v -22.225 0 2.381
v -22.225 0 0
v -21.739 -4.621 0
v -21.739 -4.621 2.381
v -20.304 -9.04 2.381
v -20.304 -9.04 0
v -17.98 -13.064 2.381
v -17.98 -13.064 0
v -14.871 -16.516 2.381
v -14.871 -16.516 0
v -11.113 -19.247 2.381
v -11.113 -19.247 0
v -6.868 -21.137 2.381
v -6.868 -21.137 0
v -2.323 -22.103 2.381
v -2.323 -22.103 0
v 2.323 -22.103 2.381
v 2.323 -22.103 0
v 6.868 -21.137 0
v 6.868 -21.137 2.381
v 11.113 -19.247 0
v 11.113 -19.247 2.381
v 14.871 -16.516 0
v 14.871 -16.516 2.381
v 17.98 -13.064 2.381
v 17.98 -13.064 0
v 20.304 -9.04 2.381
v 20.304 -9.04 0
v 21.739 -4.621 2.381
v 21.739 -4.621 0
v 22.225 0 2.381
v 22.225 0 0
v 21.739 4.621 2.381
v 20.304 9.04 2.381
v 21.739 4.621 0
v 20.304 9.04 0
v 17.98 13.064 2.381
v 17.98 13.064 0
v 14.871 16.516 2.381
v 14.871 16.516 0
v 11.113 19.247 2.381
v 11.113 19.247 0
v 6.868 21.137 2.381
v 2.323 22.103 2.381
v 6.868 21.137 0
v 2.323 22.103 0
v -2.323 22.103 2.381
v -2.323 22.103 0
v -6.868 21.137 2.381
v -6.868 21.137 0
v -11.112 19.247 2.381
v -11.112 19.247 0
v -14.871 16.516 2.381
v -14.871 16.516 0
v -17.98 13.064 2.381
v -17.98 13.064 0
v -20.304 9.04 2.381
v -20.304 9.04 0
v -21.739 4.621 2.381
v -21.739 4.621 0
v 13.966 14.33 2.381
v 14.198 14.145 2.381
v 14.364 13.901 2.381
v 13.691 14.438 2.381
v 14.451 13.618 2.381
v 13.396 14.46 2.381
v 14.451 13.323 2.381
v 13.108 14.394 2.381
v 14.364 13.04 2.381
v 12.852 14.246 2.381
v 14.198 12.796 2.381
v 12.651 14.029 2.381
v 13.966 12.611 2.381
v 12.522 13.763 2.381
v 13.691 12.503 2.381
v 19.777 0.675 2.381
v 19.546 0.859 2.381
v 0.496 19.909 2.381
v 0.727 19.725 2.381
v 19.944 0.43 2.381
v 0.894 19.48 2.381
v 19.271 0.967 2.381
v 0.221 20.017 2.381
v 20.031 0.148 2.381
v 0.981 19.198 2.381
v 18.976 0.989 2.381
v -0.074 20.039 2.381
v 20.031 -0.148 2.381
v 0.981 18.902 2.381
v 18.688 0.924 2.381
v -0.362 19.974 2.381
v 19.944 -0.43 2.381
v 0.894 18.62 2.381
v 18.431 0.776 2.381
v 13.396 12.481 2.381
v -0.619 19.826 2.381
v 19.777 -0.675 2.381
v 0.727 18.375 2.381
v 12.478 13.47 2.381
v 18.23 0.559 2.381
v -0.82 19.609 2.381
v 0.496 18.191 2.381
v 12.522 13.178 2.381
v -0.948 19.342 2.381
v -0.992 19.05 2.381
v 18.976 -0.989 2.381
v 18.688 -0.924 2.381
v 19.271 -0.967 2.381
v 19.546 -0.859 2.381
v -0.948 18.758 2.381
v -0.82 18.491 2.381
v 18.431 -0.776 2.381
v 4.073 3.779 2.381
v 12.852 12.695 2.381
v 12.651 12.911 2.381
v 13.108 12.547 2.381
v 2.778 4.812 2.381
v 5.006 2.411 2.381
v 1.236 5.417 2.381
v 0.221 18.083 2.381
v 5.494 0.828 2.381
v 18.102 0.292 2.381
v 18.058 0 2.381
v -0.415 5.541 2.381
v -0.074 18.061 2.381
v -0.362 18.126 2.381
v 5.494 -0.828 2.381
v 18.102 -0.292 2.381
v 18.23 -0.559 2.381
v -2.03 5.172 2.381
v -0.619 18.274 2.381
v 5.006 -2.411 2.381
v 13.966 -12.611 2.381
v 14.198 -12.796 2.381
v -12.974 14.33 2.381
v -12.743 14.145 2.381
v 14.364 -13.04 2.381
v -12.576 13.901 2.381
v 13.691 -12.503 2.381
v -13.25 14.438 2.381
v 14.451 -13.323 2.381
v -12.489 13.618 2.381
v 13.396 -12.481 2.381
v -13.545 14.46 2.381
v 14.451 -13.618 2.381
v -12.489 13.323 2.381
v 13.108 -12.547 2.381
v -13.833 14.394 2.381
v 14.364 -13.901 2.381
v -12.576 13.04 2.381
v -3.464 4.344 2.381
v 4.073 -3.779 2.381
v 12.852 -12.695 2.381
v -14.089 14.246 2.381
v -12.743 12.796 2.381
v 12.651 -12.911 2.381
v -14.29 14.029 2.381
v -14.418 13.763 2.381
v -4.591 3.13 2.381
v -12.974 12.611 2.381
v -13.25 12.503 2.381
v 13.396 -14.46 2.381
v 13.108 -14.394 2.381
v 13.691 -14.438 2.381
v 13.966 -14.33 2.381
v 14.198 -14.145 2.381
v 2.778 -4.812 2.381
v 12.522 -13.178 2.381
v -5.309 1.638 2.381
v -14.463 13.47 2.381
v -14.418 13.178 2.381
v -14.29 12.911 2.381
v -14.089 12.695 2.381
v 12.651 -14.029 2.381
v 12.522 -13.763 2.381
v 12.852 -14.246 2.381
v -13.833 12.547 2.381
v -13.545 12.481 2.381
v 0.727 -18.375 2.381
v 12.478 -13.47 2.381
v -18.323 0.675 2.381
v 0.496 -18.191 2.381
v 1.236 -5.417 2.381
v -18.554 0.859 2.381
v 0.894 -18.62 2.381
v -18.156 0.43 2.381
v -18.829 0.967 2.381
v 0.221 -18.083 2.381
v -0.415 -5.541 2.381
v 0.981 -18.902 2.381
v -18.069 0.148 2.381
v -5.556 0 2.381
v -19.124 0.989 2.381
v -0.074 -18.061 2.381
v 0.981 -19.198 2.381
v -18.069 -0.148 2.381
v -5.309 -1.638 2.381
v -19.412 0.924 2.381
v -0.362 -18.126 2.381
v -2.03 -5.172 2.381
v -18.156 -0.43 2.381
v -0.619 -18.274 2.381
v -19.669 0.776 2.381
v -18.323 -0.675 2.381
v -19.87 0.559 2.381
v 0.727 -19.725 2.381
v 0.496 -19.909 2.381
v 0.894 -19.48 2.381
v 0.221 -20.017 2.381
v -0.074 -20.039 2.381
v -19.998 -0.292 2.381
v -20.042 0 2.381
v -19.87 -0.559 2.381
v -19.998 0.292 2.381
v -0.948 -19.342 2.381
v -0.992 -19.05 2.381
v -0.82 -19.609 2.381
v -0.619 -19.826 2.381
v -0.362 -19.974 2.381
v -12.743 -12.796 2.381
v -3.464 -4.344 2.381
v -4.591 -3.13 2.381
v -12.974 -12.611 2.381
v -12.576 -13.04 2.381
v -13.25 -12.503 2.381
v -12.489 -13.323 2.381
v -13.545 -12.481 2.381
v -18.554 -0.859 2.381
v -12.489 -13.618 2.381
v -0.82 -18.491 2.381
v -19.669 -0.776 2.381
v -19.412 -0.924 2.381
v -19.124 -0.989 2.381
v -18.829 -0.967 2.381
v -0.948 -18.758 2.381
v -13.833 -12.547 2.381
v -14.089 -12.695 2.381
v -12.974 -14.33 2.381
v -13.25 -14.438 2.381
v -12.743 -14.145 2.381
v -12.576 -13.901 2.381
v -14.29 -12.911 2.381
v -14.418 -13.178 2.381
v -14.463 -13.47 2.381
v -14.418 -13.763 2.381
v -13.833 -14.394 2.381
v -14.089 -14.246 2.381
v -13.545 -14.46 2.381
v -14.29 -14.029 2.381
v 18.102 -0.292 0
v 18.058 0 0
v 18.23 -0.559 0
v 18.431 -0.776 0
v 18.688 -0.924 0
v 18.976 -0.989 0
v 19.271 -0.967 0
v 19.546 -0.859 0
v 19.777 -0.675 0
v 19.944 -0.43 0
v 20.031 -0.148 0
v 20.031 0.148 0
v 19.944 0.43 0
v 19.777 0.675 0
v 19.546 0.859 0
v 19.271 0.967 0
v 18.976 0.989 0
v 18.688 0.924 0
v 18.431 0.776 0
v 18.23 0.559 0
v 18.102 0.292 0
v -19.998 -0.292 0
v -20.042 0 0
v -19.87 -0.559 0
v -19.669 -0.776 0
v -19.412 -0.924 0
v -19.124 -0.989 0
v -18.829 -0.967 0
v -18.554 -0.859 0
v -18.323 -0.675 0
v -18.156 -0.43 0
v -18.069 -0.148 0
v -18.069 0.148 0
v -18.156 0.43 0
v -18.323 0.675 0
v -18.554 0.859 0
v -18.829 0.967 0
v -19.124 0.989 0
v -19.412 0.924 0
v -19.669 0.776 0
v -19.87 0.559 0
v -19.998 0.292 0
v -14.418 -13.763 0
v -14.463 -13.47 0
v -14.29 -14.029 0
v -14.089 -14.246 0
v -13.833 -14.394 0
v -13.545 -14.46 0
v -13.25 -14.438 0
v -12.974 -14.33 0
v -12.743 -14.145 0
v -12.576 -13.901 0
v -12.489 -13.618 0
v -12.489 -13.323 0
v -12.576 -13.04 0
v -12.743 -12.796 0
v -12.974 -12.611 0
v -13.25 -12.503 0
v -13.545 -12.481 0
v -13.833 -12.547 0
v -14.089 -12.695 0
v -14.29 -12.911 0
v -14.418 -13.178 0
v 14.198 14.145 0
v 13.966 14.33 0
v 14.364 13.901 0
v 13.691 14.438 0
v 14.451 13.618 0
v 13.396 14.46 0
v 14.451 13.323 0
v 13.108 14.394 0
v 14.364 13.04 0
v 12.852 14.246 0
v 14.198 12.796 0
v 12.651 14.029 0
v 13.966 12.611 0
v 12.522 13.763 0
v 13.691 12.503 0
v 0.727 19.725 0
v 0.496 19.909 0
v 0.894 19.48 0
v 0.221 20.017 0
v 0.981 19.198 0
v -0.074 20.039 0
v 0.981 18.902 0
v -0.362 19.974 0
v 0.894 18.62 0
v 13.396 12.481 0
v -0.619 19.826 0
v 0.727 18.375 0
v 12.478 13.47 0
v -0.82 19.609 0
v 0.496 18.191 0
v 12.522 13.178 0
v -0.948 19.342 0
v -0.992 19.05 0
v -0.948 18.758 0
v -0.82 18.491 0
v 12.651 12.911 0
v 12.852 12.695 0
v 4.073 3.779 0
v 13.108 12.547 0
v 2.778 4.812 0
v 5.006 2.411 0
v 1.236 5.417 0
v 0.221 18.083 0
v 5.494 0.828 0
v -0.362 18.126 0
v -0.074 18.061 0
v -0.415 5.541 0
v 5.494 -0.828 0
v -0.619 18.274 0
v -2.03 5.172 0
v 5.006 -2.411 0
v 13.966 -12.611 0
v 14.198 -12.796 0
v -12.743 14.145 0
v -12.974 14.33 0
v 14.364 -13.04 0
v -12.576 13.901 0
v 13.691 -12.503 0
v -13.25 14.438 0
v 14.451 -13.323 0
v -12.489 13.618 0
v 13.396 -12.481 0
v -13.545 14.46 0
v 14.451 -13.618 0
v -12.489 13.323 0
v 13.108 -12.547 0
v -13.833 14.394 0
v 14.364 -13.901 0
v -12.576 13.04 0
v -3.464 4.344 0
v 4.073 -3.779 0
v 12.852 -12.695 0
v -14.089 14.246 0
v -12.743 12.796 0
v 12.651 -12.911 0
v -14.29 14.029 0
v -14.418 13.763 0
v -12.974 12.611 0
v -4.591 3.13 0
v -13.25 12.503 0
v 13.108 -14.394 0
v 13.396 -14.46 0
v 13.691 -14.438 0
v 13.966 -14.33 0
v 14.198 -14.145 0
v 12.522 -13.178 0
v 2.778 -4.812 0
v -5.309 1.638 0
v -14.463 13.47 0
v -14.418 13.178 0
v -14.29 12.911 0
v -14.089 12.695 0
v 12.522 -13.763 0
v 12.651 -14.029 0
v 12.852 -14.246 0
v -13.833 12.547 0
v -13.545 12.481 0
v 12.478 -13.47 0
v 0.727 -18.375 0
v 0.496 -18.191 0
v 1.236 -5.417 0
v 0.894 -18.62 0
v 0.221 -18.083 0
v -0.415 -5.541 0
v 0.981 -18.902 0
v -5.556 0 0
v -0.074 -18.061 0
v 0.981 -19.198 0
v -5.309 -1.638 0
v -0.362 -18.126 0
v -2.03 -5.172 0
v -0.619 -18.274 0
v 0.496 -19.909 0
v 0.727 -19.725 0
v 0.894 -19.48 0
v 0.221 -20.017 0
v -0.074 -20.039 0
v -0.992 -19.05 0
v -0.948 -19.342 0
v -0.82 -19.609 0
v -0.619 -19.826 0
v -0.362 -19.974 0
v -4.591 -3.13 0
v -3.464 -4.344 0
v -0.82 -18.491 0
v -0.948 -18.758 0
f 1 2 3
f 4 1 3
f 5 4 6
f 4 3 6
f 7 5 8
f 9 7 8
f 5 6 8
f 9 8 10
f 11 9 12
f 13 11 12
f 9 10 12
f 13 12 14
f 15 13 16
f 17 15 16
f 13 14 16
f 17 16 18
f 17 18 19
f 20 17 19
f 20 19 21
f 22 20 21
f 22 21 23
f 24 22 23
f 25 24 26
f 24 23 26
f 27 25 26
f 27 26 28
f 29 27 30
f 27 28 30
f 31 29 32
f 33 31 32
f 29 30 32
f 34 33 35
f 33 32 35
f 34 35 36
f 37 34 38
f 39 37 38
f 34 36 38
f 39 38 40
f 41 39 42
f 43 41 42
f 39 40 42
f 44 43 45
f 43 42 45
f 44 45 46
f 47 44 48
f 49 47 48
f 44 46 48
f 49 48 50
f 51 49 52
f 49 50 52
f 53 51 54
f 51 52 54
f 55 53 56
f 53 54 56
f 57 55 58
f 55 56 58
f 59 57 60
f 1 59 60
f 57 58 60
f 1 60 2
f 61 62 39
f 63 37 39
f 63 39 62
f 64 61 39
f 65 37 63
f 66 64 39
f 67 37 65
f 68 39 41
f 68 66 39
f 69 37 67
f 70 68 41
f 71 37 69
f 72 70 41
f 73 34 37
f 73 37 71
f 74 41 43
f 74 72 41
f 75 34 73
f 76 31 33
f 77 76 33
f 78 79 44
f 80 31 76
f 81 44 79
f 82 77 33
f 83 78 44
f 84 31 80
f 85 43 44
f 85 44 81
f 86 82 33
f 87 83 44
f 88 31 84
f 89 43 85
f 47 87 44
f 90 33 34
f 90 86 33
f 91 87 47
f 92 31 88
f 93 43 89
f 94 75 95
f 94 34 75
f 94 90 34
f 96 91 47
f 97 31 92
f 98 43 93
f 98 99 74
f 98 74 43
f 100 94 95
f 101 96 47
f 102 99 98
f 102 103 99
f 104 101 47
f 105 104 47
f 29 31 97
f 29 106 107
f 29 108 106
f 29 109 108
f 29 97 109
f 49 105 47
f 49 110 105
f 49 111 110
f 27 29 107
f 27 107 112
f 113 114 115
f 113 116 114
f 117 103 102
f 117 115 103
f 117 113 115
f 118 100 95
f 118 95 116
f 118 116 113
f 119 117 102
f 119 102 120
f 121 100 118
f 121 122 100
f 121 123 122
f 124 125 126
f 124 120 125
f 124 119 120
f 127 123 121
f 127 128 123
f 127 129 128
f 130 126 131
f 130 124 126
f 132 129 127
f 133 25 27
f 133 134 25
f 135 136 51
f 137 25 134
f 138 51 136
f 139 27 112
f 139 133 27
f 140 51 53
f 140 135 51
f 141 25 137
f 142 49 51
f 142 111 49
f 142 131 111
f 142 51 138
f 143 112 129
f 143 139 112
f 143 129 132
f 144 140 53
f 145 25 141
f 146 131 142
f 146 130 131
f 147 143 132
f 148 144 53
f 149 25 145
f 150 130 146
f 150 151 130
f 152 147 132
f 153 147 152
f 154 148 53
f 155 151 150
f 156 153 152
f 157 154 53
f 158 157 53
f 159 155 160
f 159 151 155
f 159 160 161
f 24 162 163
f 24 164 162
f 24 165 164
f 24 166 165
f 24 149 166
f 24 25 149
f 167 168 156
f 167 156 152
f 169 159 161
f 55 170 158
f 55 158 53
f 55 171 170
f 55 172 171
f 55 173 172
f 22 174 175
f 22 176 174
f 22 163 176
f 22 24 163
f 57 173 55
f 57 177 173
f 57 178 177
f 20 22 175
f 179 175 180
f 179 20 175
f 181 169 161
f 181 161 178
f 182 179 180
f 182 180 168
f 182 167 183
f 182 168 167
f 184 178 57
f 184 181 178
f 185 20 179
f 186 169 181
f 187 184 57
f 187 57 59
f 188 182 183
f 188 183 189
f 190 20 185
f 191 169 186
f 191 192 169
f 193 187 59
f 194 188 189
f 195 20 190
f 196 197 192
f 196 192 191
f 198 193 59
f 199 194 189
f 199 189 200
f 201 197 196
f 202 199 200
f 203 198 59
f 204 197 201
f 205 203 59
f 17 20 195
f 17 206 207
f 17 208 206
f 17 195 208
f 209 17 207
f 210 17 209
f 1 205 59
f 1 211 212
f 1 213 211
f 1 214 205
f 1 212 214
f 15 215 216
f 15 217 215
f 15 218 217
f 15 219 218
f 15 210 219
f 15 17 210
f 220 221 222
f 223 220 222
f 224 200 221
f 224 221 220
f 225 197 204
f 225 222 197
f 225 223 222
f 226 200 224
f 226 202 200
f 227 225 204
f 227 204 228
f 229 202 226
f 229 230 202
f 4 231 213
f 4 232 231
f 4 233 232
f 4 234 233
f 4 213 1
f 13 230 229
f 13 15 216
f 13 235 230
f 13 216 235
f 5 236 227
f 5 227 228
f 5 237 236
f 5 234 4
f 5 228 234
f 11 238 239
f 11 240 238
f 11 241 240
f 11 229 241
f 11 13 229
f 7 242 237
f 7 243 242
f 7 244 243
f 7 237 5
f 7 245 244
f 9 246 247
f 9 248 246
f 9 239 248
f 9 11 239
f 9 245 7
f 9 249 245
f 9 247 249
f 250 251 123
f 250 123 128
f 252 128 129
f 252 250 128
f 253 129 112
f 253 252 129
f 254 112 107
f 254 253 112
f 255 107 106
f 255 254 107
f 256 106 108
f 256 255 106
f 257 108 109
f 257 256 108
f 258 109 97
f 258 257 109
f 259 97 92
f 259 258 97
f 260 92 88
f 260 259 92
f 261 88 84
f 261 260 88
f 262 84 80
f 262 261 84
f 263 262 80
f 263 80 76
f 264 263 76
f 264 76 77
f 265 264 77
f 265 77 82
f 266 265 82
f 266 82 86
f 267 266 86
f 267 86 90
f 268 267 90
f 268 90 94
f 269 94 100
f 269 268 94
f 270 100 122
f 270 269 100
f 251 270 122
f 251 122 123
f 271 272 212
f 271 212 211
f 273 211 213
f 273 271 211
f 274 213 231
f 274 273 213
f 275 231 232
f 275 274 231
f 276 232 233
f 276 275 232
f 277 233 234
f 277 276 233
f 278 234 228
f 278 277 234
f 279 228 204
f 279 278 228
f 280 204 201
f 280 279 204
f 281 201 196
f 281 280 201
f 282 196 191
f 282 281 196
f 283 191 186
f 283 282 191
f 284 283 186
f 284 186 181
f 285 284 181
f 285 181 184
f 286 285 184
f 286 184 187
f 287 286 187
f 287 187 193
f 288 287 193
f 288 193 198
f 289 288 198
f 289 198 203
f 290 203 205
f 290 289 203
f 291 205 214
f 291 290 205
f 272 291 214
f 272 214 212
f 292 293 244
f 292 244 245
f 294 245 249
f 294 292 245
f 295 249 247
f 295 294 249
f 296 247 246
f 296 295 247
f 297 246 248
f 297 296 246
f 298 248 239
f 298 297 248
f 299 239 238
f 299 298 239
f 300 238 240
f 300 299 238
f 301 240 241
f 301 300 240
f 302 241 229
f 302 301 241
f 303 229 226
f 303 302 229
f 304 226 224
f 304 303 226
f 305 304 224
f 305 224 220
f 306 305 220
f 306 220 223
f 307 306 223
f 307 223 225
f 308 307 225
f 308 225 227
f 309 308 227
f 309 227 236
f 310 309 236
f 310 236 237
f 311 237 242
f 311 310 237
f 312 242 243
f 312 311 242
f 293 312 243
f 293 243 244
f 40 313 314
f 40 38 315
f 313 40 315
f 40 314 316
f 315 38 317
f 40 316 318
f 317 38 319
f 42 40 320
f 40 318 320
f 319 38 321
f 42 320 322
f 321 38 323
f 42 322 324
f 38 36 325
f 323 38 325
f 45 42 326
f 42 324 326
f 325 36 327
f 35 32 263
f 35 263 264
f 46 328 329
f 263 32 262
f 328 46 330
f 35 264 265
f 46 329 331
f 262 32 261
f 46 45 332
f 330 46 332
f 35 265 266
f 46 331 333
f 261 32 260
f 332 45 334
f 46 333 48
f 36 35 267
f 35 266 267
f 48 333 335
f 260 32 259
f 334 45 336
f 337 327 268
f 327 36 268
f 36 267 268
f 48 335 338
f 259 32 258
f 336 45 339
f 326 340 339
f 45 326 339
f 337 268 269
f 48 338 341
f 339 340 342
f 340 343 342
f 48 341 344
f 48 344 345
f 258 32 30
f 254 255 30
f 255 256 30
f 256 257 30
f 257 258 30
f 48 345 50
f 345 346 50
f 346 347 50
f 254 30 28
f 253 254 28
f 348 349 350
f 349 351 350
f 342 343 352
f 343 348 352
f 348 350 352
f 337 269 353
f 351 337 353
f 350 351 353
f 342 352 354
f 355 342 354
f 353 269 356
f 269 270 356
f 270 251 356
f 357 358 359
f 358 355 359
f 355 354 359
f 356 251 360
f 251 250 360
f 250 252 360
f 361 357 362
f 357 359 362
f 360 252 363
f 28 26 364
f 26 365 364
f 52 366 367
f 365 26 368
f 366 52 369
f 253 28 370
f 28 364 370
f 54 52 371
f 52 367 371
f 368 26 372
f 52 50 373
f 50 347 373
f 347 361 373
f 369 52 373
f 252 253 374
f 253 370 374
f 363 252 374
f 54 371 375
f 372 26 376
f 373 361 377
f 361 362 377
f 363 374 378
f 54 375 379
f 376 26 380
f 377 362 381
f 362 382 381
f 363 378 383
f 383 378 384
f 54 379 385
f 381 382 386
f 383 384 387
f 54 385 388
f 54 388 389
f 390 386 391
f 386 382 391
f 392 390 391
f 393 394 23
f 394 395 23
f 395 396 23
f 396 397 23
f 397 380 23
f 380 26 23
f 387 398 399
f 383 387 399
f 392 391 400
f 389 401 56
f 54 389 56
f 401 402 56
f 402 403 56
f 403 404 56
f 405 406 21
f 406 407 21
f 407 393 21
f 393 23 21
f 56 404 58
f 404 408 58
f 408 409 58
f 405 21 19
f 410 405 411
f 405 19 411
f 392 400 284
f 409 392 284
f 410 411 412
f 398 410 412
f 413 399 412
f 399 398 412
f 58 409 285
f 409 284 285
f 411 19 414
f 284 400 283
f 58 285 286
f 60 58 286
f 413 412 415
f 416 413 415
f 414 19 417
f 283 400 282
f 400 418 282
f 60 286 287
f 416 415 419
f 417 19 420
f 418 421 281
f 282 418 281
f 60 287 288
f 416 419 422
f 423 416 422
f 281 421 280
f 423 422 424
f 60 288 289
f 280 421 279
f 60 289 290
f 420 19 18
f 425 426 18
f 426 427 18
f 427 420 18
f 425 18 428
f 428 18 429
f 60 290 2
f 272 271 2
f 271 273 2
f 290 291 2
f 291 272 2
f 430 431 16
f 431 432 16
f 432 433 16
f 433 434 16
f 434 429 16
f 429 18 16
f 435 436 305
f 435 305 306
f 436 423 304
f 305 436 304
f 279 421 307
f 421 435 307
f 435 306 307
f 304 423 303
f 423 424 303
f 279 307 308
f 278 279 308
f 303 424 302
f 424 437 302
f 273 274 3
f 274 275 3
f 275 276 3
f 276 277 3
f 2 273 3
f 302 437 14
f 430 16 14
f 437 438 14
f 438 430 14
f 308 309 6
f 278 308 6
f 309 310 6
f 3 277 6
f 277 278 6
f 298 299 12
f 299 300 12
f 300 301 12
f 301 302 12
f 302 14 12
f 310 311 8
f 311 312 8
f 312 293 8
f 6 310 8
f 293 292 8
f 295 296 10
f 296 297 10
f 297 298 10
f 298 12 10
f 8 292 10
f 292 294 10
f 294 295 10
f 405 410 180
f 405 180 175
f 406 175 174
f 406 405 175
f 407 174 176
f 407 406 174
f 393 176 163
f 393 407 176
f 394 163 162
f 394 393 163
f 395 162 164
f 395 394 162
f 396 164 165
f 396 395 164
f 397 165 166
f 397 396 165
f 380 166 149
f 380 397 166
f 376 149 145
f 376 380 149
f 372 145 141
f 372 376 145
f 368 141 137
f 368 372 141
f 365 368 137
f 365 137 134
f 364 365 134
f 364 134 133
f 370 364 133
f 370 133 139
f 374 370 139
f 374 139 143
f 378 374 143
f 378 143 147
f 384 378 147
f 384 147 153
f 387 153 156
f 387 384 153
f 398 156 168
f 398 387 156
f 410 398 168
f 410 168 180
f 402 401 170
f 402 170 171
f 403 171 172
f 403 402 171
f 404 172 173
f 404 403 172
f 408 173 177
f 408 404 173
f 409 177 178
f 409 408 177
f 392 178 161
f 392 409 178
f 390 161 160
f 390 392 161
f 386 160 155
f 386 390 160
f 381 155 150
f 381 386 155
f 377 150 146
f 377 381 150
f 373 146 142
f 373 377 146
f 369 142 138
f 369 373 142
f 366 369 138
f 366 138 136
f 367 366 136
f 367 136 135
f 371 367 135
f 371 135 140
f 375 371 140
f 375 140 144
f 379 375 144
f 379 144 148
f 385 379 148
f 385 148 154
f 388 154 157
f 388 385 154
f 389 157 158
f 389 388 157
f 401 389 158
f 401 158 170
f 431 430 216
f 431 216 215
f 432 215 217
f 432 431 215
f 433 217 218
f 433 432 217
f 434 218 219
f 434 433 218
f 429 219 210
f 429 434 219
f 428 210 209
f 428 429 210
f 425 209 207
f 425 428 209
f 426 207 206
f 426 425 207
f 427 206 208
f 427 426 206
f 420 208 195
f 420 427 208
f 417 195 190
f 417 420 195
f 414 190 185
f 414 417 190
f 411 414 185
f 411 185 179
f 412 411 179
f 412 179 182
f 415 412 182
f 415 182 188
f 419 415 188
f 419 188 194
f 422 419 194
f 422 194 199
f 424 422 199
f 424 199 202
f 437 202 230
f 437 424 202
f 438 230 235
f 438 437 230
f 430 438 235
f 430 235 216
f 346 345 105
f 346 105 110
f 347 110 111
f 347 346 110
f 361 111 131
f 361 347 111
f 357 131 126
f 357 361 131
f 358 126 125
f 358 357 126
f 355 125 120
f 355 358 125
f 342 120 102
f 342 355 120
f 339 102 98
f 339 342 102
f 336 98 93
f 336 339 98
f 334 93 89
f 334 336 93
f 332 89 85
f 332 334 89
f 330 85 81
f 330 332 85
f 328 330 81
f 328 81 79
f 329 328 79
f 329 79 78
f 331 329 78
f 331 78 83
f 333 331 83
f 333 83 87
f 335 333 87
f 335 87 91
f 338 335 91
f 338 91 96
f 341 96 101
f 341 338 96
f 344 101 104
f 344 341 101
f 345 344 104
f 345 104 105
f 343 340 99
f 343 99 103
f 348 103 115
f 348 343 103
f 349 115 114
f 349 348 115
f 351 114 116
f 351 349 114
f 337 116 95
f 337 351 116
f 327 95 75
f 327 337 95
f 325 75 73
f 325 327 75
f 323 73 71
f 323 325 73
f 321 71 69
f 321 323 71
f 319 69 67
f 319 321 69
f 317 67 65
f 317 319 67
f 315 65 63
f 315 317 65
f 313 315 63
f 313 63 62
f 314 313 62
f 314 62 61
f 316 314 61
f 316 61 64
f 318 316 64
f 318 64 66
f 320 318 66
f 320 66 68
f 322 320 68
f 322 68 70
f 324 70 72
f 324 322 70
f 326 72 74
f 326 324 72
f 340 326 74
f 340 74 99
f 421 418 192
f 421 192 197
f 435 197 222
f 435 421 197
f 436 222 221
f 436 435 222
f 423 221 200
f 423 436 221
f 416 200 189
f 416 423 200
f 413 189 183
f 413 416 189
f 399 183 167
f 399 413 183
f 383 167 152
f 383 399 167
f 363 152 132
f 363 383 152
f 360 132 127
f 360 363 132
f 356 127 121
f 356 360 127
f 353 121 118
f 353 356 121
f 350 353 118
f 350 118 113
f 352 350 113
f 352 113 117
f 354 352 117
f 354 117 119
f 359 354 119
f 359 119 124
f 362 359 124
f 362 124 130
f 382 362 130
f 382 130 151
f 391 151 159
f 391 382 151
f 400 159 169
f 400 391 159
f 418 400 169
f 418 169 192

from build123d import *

# Parameters (mm, degrees)
SKETCH1_R           = 22.225
SKETCH1_R_2         = 0.9921875
SKETCH1_R_3         = 5.55625
BOSS_EXTRUDE1_DEPTH = 2.38125


with BuildPart() as part:
    # Sketch1 → Boss-Extrude1 (new body)
    with BuildSketch(Plane.XY):
        with Locations(Location((0, 0, 0), (0, 0, 180))):
            Circle(SKETCH1_R)
        with Locations(Location((-19.05, 0, 0), (0, 0, 180))):
            Circle(SKETCH1_R_2, mode=Mode.SUBTRACT)
        with Locations(Location((-13.470384182, 13.470384182, 0), (0, 0, 180))):
            Circle(SKETCH1_R_2, mode=Mode.SUBTRACT)
        with Locations(Location((0, 19.05, 0), (0, 0, 180))):
            Circle(SKETCH1_R_2, mode=Mode.SUBTRACT)
        with Locations(Location((13.470384182, 13.470384182, 0), (0, 0, 180))):
            Circle(SKETCH1_R_2, mode=Mode.SUBTRACT)
        with Locations(Location((19.05, 0, 0), (0, 0, 180))):
            Circle(SKETCH1_R_2, mode=Mode.SUBTRACT)
        with Locations(Location((13.470384182, -13.470384182, 0), (0, 0, 180))):
            Circle(SKETCH1_R_2, mode=Mode.SUBTRACT)
        with Locations(Location((0, -19.05, 0), (0, 0, 180))):
            Circle(SKETCH1_R_2, mode=Mode.SUBTRACT)
        with Locations(Location((-13.470384182, -13.470384182, 0), (0, 0, 180))):
            Circle(SKETCH1_R_2, mode=Mode.SUBTRACT)
        with Locations(Location((0, 0, 0), (0, 0, 180))):
            Circle(SKETCH1_R_3, mode=Mode.SUBTRACT)
    extrude(amount=BOSS_EXTRUDE1_DEPTH)


solid = part.part
